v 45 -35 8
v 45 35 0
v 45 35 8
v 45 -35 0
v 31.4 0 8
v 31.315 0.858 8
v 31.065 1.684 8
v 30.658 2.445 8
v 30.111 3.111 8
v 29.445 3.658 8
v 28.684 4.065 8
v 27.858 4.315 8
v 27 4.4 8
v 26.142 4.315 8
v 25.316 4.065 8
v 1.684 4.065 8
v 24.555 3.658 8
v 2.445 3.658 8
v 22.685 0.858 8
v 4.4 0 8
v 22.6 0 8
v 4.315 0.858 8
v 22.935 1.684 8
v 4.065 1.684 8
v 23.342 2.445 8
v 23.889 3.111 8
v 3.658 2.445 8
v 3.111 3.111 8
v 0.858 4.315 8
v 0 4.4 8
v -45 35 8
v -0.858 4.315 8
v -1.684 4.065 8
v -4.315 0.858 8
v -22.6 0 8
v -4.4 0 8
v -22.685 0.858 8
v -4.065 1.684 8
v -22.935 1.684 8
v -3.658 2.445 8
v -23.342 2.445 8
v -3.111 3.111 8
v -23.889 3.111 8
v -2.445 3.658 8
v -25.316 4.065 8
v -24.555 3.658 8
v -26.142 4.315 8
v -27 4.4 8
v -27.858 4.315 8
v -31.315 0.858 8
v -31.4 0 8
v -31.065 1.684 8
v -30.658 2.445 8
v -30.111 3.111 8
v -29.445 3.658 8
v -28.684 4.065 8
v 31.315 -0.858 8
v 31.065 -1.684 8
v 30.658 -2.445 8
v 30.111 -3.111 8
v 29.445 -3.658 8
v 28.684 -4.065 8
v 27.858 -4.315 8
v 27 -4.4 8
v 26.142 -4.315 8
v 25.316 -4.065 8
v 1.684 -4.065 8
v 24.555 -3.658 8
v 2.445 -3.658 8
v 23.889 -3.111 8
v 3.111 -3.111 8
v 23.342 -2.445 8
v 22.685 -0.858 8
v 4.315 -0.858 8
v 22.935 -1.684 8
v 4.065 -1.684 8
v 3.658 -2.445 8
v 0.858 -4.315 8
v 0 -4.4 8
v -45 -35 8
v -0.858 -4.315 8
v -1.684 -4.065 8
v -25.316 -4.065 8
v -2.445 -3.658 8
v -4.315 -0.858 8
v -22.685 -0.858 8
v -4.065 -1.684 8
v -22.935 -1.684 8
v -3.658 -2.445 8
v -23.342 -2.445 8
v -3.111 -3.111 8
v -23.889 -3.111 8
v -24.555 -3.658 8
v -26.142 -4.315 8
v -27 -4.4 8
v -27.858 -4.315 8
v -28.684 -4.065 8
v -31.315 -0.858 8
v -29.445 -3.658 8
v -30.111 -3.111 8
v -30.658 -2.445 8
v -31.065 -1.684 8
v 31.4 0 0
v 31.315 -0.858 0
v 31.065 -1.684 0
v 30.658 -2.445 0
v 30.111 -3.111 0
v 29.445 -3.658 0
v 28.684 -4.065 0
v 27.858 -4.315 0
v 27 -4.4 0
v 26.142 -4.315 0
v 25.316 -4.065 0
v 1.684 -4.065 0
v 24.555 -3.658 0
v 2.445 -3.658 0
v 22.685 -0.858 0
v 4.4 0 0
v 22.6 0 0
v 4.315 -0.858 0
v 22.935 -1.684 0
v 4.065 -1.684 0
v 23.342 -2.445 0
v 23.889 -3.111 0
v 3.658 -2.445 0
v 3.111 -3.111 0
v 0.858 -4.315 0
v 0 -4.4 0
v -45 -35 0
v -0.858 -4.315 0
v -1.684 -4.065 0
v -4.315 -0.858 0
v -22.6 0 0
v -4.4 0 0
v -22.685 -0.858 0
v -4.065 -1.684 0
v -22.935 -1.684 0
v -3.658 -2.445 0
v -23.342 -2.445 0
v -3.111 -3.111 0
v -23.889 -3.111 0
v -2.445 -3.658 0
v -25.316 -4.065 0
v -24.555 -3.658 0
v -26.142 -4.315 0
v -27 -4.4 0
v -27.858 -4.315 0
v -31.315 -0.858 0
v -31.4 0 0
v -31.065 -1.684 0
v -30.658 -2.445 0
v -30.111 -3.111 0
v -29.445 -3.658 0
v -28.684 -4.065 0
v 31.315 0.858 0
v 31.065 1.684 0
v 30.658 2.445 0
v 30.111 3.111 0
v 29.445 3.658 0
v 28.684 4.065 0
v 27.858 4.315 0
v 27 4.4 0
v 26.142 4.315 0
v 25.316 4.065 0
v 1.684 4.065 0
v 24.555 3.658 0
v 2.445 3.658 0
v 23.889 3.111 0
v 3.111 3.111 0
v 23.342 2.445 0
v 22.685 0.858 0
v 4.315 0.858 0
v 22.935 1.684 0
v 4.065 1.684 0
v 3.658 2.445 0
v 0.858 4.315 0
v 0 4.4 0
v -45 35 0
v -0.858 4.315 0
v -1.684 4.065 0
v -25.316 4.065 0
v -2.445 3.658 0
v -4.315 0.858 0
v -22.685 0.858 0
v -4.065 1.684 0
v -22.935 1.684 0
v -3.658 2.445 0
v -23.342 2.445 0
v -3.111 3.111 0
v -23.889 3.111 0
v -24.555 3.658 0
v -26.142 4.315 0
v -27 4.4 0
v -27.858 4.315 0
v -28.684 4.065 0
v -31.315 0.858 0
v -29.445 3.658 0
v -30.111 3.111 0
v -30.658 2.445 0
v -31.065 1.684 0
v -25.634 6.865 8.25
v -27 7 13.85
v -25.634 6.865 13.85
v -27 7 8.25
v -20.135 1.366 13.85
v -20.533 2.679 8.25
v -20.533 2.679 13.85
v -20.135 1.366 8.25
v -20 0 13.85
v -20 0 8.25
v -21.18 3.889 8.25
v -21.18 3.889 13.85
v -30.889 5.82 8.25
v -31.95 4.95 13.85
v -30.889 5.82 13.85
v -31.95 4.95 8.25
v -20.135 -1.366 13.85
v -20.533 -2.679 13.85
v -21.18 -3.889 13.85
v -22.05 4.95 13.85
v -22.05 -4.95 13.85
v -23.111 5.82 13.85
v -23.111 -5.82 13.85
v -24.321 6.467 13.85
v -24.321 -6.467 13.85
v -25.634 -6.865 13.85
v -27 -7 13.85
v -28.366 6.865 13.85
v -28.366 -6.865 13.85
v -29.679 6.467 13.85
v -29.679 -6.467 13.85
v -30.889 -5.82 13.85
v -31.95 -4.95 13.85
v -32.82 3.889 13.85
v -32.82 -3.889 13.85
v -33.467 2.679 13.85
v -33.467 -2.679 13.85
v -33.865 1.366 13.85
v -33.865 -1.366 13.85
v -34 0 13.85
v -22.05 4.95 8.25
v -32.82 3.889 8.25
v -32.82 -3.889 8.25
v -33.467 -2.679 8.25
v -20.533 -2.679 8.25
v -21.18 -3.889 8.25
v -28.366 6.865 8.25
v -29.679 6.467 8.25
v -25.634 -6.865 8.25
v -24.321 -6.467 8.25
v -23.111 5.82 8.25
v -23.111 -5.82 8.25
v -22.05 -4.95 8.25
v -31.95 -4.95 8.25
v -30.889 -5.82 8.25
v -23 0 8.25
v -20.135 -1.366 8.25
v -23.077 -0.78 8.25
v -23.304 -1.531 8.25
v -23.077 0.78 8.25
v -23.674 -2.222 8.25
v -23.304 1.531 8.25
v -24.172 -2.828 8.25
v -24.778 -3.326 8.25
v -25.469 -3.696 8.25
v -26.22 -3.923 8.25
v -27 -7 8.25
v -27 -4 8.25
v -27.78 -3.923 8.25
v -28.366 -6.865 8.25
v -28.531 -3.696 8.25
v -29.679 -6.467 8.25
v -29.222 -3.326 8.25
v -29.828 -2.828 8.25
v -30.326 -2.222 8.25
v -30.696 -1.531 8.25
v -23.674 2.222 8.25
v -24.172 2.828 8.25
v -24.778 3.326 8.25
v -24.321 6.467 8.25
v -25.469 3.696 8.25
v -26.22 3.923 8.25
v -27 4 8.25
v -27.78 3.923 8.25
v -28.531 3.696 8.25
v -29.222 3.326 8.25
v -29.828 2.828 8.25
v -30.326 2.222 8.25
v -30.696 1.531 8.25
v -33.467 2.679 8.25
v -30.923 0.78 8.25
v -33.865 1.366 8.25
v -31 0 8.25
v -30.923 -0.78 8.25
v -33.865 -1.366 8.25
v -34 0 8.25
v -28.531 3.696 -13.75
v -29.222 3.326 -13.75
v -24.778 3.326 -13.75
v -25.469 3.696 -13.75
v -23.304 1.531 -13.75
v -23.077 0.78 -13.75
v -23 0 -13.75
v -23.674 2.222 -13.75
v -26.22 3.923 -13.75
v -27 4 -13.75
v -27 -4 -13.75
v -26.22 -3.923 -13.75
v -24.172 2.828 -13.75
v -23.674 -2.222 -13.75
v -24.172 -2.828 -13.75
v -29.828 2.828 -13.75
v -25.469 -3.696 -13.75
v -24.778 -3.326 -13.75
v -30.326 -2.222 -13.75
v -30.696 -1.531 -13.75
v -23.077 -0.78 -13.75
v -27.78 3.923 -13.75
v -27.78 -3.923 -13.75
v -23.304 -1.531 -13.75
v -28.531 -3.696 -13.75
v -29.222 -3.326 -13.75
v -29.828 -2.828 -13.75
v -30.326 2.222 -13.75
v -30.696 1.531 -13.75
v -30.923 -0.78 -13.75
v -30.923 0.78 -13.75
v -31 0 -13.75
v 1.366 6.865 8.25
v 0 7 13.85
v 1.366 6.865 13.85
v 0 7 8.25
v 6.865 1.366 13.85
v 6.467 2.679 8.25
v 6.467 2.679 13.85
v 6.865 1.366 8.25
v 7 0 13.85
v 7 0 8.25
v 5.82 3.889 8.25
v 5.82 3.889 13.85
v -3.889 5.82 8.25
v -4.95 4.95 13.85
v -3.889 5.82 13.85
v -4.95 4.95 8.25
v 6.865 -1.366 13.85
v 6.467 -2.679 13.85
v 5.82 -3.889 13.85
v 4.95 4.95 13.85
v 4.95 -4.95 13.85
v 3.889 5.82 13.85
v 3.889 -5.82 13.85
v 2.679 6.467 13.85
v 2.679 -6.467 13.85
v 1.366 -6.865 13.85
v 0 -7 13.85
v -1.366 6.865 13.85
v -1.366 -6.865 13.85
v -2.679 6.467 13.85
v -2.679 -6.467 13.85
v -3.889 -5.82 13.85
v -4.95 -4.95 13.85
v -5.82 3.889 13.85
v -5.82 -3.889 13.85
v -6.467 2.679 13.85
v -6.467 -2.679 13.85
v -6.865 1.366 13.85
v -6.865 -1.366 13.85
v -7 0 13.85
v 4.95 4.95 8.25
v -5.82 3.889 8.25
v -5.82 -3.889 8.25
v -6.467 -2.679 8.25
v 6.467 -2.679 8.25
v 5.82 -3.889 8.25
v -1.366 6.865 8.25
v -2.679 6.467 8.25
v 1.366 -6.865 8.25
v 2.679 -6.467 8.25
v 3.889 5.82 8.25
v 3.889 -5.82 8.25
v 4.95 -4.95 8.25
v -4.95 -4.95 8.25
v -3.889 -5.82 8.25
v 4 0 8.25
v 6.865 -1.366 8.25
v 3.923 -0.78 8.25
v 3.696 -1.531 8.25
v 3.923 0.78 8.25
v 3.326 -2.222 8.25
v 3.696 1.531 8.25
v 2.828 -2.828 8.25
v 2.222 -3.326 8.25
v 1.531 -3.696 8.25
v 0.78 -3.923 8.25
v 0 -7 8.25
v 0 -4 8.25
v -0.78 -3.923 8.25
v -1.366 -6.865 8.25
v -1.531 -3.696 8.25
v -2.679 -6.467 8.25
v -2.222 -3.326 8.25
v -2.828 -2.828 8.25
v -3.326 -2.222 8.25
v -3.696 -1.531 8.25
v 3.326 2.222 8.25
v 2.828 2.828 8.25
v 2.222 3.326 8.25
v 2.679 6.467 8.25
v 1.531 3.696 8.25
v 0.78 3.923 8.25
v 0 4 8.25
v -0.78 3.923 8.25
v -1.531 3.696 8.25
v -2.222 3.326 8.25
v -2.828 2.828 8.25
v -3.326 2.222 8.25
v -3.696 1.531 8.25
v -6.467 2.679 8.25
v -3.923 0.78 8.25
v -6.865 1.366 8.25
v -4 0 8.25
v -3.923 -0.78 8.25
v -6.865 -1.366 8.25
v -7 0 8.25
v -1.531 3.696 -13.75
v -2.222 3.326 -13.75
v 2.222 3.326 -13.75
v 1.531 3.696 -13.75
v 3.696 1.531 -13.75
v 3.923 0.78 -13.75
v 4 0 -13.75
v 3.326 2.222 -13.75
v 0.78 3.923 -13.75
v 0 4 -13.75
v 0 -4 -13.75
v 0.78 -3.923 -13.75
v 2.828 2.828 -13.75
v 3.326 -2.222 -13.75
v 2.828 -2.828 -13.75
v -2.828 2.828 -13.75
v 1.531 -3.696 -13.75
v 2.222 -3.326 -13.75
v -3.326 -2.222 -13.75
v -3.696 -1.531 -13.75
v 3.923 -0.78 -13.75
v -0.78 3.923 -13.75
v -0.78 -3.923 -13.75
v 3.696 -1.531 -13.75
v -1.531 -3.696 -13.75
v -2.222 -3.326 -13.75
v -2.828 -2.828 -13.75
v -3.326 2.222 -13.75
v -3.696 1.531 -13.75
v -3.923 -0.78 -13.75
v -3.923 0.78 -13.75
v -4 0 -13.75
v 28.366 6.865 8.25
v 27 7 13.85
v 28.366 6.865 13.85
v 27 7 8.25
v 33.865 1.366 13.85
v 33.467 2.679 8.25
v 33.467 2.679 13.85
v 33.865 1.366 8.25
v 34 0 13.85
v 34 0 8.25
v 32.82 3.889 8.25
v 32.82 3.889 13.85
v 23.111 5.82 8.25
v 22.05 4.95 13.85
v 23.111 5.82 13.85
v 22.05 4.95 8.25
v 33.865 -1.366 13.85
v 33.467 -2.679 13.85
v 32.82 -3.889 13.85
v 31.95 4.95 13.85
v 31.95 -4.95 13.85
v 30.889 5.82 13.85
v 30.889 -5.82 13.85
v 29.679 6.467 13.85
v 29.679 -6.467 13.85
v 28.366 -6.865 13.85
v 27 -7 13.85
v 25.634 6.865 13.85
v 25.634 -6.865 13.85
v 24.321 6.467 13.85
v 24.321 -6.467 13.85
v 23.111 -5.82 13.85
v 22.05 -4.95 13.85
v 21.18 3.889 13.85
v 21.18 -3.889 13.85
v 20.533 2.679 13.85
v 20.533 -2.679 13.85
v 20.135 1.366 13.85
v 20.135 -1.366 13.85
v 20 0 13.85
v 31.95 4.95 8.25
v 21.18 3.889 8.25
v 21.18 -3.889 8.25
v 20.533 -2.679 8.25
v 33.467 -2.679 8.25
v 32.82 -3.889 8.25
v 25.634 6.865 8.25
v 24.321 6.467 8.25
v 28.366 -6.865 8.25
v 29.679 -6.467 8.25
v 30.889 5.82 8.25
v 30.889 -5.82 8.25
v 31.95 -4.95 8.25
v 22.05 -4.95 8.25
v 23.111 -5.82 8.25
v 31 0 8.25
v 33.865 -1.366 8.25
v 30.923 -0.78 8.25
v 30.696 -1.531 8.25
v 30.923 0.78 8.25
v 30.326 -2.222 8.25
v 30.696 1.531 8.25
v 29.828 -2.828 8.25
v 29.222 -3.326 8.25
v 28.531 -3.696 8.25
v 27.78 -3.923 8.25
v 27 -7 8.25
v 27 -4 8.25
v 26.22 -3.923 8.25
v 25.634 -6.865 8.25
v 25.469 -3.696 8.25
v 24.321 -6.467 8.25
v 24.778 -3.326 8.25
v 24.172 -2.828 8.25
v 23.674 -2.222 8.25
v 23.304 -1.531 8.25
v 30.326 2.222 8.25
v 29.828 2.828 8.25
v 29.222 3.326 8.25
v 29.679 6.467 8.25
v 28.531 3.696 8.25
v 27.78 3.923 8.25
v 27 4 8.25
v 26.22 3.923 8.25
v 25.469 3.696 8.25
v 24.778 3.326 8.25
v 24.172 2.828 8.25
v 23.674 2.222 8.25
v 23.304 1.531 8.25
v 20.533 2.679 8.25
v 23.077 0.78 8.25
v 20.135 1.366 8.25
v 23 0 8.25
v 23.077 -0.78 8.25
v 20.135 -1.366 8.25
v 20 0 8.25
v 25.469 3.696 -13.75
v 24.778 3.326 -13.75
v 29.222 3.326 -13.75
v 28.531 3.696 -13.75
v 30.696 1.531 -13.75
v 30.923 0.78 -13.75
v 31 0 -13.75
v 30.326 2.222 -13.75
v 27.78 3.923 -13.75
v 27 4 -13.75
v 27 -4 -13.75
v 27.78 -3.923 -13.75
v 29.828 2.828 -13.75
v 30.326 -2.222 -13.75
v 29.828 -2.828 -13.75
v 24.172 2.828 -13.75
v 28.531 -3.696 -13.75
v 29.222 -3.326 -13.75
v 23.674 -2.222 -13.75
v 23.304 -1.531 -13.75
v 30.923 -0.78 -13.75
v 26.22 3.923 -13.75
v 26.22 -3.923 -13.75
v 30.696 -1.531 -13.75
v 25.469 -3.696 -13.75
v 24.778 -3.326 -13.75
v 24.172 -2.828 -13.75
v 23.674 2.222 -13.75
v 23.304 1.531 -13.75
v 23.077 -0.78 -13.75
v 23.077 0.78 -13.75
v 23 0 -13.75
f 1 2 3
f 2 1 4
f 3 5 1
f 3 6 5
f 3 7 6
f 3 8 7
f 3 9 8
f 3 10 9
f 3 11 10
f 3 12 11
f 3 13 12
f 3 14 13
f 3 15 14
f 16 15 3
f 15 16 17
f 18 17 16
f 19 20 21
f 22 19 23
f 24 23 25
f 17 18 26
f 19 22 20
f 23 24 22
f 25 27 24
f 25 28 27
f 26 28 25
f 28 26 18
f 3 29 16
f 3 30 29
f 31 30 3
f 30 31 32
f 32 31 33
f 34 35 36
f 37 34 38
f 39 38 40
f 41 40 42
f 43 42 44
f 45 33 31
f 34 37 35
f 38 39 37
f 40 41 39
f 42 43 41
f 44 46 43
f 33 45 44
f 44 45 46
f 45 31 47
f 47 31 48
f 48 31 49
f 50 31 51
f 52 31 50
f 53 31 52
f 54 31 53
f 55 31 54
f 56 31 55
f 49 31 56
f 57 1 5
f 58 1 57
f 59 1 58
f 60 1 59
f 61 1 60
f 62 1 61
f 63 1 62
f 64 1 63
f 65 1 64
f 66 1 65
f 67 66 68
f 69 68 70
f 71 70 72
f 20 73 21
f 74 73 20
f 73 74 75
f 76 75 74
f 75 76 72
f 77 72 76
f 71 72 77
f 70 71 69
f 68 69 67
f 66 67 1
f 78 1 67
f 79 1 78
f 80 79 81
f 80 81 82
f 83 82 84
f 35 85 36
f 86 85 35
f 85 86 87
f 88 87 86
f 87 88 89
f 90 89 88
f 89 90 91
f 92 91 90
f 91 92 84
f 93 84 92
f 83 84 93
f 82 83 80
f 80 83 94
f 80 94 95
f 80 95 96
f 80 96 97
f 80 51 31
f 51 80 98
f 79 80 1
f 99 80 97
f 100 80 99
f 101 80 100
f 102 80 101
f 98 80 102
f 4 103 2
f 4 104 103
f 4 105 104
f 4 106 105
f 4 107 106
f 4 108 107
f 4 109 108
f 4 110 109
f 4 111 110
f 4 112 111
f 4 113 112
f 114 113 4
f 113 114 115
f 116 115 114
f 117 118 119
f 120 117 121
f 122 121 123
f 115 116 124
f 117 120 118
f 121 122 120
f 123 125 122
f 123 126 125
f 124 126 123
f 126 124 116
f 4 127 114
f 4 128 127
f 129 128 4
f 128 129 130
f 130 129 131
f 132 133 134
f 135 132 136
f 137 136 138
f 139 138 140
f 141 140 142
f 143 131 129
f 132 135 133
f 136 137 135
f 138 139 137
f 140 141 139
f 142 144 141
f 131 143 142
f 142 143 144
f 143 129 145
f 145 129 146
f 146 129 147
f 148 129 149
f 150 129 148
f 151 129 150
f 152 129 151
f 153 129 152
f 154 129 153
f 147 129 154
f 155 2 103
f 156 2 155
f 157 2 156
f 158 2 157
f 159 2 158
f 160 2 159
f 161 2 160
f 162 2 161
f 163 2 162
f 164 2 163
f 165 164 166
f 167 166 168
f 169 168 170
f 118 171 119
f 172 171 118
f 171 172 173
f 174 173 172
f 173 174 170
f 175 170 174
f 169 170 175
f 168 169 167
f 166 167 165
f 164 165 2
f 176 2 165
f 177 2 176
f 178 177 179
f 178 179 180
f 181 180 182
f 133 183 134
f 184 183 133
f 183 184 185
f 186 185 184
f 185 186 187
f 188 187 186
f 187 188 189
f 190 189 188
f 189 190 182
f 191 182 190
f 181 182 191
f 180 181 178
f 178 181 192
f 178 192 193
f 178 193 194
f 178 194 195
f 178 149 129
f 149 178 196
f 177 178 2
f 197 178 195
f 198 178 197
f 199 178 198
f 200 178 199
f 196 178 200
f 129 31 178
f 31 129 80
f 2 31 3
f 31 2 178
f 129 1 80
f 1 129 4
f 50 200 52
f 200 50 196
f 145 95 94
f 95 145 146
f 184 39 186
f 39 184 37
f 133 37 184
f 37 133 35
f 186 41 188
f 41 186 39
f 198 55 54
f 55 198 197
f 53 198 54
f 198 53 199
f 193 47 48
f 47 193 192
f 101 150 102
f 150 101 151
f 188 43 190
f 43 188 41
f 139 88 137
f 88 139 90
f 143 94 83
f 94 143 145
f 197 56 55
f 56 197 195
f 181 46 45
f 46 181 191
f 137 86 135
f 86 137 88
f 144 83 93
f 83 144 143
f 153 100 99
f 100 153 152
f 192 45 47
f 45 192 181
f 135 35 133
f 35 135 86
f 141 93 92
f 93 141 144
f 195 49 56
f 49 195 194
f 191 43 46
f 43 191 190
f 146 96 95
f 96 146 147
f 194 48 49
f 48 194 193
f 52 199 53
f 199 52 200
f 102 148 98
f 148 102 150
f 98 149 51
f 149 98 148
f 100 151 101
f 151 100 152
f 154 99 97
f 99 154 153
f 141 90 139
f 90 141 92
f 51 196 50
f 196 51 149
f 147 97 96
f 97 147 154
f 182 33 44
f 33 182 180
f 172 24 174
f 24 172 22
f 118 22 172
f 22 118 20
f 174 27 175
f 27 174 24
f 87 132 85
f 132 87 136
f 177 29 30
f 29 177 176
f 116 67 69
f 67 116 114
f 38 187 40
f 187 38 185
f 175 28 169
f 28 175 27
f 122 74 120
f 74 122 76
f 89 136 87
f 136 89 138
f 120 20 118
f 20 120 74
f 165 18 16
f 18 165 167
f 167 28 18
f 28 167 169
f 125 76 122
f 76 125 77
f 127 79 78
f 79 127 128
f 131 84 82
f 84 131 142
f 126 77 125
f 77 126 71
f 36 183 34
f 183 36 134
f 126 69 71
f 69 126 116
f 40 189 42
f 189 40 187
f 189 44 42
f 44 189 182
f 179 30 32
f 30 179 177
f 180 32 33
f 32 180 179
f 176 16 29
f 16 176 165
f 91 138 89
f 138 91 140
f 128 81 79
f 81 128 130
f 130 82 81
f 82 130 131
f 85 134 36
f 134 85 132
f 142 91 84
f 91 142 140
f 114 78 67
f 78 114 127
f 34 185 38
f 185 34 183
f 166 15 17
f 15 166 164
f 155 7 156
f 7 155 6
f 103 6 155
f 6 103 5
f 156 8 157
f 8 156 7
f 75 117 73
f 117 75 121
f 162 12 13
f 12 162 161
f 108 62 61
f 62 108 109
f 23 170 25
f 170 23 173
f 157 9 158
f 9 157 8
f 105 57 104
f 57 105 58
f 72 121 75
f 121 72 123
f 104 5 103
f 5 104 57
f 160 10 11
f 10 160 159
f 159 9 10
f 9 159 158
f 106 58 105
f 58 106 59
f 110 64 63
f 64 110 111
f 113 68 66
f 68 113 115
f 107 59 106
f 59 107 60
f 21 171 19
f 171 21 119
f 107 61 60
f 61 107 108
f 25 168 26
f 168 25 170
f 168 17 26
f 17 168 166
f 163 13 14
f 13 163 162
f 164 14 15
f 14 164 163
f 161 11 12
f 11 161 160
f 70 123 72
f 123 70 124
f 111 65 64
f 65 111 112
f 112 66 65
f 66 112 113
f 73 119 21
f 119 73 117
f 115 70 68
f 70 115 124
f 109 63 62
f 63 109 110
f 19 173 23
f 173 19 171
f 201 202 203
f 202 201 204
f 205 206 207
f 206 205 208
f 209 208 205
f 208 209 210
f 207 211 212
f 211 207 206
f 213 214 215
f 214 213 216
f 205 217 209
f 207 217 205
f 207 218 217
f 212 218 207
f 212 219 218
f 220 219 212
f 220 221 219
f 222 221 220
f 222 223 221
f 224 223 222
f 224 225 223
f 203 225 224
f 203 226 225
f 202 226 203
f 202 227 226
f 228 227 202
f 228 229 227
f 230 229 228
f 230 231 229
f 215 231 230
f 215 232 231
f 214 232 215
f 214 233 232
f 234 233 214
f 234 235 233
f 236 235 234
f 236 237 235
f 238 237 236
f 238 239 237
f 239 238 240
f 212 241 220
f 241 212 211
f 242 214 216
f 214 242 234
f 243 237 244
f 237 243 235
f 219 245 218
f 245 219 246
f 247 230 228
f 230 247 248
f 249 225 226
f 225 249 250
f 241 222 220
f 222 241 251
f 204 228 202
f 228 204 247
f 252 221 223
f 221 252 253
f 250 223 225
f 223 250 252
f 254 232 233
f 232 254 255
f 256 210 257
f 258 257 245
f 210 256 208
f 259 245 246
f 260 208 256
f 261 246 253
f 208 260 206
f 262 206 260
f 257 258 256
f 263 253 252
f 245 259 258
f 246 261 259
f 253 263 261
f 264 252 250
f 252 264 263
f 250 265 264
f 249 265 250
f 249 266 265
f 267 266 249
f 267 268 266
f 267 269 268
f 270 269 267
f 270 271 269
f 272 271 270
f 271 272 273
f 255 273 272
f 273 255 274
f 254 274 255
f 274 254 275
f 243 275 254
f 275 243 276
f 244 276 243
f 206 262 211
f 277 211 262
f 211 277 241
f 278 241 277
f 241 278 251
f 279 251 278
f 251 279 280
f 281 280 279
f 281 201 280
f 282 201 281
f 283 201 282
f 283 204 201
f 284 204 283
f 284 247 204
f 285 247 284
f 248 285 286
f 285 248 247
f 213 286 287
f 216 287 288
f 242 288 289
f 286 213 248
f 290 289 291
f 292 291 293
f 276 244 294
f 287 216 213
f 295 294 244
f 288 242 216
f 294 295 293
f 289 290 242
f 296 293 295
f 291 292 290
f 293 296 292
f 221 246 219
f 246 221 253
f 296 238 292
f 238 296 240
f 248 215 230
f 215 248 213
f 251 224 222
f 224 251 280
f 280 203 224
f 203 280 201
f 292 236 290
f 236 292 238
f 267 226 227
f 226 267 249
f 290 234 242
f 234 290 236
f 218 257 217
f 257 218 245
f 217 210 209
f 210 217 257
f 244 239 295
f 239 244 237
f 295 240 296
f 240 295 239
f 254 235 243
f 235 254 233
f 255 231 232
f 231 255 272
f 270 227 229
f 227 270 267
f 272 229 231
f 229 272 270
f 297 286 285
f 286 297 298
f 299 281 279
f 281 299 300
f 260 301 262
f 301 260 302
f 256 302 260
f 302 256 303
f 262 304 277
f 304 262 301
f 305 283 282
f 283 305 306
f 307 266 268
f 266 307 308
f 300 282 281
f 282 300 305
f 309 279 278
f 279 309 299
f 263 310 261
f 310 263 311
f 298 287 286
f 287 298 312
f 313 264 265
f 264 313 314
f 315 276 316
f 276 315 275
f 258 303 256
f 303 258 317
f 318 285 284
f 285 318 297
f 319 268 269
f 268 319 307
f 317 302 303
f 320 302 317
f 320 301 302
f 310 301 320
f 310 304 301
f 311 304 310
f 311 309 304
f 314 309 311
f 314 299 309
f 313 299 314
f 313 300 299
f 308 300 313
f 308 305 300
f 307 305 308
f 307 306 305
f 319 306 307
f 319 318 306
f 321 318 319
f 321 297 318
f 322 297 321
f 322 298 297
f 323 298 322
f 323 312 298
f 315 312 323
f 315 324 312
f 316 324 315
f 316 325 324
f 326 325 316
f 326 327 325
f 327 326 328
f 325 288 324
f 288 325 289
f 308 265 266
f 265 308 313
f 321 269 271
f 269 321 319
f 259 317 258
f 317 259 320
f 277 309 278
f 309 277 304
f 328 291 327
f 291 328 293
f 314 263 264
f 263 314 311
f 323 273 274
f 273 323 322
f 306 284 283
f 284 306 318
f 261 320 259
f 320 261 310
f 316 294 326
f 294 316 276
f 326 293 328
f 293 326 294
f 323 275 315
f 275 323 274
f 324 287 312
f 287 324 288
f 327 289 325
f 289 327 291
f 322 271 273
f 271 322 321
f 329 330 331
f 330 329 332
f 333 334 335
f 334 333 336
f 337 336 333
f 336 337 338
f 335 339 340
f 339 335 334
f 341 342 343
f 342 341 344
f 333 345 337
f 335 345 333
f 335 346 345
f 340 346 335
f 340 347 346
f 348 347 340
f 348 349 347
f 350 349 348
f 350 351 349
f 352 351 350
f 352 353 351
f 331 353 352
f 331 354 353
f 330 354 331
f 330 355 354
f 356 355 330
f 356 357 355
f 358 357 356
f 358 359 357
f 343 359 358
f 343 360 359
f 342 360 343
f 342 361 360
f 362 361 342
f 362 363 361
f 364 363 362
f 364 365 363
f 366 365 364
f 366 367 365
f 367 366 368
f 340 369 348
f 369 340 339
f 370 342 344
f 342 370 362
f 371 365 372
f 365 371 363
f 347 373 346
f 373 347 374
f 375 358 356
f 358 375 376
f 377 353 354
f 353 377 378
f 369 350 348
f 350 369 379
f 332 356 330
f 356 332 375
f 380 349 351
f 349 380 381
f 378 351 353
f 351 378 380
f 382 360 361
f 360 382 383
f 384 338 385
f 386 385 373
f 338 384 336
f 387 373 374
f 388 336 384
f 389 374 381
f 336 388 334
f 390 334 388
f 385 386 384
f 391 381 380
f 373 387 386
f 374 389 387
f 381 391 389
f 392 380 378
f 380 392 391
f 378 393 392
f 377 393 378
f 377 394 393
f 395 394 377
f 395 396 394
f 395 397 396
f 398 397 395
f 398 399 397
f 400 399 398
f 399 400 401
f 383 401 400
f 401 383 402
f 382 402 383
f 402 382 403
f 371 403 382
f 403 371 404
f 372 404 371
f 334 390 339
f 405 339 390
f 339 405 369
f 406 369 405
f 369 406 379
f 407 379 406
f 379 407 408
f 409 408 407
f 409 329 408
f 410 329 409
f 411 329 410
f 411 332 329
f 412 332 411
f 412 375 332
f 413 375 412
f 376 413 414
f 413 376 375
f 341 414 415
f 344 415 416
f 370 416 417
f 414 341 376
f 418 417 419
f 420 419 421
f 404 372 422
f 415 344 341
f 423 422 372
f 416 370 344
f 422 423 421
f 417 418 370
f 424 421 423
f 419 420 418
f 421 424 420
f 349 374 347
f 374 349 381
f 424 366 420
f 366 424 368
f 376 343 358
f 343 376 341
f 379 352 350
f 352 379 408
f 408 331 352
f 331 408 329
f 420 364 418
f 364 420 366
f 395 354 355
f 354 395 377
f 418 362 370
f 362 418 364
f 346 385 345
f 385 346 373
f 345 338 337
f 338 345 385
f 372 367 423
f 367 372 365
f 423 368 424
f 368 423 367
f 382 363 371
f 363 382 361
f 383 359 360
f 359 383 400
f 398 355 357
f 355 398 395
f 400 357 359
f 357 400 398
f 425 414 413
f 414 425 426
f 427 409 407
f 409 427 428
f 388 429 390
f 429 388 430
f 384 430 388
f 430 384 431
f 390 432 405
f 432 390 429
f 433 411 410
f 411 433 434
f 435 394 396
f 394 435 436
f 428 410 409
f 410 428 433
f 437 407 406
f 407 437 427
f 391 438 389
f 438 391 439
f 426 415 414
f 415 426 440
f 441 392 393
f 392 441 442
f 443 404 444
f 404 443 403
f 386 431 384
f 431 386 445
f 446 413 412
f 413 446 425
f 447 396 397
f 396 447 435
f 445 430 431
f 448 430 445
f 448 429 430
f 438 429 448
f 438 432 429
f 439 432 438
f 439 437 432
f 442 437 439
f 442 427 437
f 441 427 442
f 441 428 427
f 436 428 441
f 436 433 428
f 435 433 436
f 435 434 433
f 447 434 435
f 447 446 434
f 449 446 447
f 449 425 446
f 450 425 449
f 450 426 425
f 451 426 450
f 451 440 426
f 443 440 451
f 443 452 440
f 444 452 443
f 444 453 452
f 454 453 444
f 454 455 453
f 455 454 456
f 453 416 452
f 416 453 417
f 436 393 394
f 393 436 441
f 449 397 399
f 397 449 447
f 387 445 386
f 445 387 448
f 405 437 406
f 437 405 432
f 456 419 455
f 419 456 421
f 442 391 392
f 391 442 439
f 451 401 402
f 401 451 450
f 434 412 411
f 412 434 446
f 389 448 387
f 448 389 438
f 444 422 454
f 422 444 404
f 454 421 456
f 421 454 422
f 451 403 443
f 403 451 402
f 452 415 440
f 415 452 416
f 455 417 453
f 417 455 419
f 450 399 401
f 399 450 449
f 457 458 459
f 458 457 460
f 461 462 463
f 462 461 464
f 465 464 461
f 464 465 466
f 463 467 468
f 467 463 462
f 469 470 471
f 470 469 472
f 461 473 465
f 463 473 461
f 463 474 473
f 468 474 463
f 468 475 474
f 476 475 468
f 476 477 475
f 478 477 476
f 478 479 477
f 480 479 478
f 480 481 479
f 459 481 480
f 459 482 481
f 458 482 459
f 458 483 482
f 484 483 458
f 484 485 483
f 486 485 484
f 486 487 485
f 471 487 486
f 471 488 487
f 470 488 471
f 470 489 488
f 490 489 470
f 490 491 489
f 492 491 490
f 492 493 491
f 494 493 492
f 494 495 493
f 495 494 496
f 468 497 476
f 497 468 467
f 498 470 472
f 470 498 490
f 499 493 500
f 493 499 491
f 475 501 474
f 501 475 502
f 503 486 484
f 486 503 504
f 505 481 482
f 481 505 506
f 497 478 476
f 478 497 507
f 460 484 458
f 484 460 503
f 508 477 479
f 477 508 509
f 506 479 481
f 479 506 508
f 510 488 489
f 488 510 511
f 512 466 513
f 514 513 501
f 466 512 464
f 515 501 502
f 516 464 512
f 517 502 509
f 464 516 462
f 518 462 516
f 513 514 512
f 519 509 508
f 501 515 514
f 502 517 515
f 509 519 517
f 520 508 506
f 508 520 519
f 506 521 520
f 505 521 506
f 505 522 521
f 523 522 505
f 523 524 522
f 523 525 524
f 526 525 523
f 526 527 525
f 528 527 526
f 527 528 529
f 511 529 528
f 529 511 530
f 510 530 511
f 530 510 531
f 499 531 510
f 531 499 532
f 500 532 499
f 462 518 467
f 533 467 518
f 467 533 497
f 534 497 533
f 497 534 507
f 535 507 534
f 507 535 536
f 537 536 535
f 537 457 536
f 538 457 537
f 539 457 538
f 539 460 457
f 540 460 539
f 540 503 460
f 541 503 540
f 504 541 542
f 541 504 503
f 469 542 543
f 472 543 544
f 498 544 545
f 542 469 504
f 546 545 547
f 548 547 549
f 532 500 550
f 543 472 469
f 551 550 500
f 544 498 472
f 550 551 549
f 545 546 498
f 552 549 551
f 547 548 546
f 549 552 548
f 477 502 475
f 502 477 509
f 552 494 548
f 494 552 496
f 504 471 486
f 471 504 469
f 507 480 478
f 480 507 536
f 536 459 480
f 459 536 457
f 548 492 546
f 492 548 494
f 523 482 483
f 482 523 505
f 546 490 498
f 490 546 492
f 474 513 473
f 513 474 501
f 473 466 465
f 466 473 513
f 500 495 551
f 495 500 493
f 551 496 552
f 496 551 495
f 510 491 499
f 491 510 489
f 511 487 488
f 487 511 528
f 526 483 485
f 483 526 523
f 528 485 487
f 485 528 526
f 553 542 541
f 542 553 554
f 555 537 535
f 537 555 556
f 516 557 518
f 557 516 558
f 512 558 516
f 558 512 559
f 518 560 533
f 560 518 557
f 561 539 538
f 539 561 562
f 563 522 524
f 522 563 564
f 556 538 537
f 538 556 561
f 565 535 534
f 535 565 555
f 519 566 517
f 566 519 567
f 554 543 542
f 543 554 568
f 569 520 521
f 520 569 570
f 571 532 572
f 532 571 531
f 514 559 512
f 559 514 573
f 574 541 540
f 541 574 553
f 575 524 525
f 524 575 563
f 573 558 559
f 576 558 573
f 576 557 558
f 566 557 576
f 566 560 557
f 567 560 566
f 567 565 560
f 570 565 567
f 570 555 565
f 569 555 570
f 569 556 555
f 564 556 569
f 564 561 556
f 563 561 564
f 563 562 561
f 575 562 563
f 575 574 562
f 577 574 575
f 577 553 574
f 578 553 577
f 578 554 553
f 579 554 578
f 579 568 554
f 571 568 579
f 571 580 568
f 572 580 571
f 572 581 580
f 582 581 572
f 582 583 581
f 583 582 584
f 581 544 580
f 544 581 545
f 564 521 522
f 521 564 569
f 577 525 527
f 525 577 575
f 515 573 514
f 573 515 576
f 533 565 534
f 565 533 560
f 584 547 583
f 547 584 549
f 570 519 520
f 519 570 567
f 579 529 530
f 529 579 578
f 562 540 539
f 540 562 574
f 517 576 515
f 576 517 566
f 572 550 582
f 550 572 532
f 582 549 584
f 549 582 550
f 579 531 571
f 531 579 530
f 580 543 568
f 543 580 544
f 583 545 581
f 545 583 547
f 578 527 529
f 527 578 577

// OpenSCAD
$fn = 32;

// ------------------------------------------------------------------------
// Bolted plate: 90 x 70 x 8 mm plate, 3 fasteners
// Every part is its own module, assembly() places them once.
// ------------------------------------------------------------------------

// --- part 1 ---
module plate() {
  difference() {
    translate([-45, -35, 0]) cube([90, 70, 8]);
    translate([-27, 0, -1]) cylinder(h = 10, d = 8.8);
    translate([0, 0, -1]) cylinder(h = 10, d = 8.8);
    translate([27, 0, -1]) cylinder(h = 10, d = 8.8);
  }
}

// --- part 2 ---
module bolt1() {
  cylinder(h = 5.6, d = 14);
  translate([0, 0, -22]) cylinder(h = 22, d = 8);
}

// --- part 3 ---
module bolt2() {
  cylinder(h = 5.6, d = 14);
  translate([0, 0, -22]) cylinder(h = 22, d = 8);
}

// --- part 4 ---
module bolt3() {
  cylinder(h = 5.6, d = 14);
  translate([0, 0, -22]) cylinder(h = 22, d = 8);
}

// --- assembly ---
module assembly() {
  translate([0, 0, 0]) rotate([0, 0, 0]) plate();
  translate([-27, 0, 8.25]) rotate([0, 0, 0]) bolt1();
  translate([0, 0, 8.25]) rotate([0, 0, 0]) bolt2();
  translate([27, 0, 8.25]) rotate([0, 0, 0]) bolt3();
}

assembly();
